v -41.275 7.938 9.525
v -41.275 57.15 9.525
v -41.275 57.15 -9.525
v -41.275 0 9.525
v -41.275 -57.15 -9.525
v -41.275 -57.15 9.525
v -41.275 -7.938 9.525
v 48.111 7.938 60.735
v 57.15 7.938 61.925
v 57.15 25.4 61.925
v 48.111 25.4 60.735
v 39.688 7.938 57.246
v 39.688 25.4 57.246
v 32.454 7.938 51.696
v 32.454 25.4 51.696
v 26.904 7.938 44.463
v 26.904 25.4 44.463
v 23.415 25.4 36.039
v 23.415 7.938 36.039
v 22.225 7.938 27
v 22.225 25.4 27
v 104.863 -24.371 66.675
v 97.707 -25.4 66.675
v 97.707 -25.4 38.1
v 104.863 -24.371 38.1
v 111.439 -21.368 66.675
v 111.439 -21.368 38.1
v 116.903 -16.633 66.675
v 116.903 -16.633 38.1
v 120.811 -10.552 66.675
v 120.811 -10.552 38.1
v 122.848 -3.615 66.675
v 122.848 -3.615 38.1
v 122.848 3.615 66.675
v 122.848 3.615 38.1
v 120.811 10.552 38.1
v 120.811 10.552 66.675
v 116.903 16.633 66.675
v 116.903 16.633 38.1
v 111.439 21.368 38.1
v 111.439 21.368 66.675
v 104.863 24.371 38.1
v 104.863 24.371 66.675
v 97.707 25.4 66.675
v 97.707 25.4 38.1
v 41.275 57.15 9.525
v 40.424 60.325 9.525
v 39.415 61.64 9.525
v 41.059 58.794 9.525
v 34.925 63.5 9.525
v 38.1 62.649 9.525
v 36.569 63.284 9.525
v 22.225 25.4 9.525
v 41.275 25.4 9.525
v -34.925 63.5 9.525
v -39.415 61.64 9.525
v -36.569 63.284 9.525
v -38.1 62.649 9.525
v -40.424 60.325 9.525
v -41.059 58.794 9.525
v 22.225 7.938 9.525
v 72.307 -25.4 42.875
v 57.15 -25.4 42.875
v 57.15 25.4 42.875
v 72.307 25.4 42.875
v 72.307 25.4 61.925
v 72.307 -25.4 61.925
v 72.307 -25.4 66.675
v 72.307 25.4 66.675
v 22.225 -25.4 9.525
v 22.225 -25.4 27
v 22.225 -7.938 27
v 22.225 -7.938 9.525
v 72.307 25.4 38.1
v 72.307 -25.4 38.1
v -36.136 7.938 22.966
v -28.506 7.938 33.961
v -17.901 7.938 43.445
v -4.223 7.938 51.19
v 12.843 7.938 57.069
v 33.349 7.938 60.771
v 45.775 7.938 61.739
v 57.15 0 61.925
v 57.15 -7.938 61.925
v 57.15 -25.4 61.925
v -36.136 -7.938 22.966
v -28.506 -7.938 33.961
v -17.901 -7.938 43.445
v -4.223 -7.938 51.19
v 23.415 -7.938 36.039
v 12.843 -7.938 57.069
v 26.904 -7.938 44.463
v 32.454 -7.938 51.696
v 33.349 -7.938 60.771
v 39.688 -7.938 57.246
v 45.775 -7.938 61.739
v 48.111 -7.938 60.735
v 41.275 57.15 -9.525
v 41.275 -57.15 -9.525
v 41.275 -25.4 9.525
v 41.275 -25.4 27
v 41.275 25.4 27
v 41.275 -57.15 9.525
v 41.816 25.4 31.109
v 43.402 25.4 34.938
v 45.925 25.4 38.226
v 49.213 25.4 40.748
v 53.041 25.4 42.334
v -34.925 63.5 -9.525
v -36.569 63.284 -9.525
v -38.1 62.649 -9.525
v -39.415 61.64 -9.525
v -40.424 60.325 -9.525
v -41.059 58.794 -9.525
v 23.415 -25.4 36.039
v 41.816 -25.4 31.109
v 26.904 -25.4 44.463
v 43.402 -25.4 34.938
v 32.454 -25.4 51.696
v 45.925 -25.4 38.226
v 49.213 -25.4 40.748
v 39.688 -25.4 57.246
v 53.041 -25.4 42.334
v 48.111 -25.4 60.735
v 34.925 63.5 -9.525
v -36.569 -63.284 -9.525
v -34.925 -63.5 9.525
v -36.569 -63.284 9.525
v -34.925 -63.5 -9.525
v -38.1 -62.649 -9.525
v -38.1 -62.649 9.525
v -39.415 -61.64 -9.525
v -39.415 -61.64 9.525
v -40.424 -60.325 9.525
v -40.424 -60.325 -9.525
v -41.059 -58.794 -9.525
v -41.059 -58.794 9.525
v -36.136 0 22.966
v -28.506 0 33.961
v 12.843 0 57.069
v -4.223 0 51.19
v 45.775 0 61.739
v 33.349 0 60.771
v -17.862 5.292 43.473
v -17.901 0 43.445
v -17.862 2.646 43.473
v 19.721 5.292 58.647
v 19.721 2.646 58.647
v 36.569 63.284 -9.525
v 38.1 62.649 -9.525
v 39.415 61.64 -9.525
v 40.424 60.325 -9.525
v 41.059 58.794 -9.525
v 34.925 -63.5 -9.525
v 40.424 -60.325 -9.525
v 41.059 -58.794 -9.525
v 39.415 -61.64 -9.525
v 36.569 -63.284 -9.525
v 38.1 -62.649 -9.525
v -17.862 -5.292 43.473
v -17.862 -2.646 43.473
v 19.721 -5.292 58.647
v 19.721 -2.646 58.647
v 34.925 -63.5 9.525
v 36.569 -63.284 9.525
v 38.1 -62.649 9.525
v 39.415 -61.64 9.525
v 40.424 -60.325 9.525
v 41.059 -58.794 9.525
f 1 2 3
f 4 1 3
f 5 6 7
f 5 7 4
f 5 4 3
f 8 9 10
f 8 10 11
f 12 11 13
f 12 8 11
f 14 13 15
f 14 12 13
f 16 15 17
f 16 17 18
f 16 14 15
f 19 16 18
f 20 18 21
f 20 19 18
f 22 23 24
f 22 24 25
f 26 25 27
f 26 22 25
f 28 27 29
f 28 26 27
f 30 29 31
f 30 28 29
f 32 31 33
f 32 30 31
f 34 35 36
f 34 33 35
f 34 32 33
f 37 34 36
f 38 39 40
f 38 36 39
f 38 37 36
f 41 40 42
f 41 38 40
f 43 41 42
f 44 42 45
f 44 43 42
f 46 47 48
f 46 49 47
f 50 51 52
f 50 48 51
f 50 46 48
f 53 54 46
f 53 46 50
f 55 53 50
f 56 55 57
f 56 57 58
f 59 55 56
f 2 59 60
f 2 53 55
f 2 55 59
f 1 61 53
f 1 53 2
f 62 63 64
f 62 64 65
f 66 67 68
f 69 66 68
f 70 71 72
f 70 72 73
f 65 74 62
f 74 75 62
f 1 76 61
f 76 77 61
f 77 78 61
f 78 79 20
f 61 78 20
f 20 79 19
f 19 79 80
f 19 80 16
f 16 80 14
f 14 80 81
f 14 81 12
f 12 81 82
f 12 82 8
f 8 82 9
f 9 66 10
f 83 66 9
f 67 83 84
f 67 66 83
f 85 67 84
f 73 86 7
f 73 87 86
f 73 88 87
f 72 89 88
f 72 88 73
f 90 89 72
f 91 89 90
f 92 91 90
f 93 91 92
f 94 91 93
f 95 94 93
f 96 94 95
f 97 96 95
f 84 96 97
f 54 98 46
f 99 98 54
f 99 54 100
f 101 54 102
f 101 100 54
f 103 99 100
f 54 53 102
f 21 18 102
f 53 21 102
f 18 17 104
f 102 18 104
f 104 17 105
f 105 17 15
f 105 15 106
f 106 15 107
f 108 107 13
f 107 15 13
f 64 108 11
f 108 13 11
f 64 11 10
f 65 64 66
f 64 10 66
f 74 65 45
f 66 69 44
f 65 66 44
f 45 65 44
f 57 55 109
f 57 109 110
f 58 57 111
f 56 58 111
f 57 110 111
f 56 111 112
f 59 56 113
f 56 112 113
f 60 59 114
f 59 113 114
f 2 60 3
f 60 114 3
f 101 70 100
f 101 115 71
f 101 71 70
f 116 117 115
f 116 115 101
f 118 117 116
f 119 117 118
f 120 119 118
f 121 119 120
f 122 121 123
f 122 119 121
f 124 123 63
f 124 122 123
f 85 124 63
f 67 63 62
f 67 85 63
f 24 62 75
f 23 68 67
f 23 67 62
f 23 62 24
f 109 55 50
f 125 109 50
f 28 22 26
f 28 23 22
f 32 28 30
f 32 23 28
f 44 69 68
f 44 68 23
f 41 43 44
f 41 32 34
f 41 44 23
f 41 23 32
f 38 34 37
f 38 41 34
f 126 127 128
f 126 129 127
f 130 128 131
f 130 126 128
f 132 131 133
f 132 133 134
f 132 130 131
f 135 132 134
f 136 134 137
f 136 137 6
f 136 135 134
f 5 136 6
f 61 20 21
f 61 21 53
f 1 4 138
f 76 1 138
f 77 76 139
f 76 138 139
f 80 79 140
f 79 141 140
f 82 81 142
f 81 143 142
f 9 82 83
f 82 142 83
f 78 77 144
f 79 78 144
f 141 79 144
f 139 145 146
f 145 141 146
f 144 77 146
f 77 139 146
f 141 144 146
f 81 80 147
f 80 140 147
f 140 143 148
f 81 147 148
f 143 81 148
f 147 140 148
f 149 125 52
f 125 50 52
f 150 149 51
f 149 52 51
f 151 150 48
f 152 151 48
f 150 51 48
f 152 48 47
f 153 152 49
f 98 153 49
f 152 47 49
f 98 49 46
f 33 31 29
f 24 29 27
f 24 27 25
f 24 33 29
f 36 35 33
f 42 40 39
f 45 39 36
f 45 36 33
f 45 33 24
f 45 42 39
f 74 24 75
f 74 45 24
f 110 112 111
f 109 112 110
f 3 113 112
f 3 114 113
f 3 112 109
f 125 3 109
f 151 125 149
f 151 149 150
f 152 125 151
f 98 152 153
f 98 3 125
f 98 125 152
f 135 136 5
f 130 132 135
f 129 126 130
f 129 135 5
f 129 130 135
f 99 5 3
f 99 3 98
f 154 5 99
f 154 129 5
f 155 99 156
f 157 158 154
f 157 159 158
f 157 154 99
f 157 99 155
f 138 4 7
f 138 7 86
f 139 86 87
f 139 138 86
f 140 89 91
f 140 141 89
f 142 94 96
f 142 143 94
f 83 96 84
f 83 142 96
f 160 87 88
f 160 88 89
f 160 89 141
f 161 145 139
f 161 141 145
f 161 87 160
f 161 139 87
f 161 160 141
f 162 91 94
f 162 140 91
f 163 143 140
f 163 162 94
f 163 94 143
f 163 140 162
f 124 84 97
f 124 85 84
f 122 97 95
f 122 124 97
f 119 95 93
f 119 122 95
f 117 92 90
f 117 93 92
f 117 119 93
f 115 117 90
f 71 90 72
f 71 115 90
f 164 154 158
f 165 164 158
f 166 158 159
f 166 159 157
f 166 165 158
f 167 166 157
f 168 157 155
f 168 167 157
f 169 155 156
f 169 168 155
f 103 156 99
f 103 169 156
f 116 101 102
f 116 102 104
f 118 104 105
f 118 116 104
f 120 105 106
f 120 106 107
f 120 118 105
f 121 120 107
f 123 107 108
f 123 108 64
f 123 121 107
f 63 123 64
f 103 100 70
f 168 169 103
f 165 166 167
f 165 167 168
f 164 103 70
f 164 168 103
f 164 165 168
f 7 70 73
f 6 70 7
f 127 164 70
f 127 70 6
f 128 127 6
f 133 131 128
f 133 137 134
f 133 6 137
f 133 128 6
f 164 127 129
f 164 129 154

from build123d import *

# Parameters (mm, degrees)
F1_DEPTH = 63.5
F0_W     = 25.4
F0_H     = 19.05
F0_H_2   = 4.7498
F0_H_3   = 4.7752
F2_DEPTH = 25.4
F3_DEPTH = 7.9375
F5_R     = 6.35


with BuildPart() as f1:
    # F0 (on Front) → F1 (new body, symmetric)
    with BuildSketch(Plane.XZ):
        Polygon((41.275, -9.525), (41.275, 9.525), (22.225, 9.525), (-41.275, 9.525), (-41.275, -9.525), align=None)
    extrude(amount=F1_DEPTH, both=True)

    # F0 (on Front) → F2 (join, symmetric)
    with BuildSketch(Plane.XZ):
        with BuildLine():
            Line((22.225, 9.525), (41.275, 9.525))
            Line((41.275, 9.525), (41.275, 27.0002))
            ThreePointArc((41.275, 27.0002), (45.9246798487, 38.2255201513), (57.15, 42.8752))
            Line((57.15, 42.8752), (72.3065137863, 42.8752))
            Line((72.3065137863, 42.8752), (72.3065137863, 61.9252))
            Line((72.3065137863, 61.9252), (57.15, 61.9252))
            ThreePointArc((57.15, 61.9252), (32.4542956671, 51.6959043329), (22.225, 27.0002))
            Line((22.225, 27.0002), (22.225, 9.525))
        make_face()
        with Locations((85.0065137863, 52.4002)):
            Rectangle(F0_W, F0_H)
        with Locations((85.0065137863, 64.3001)):
            Rectangle(F0_W, F0_H_2)
        with Locations((85.0065137863, 40.4876)):
            Rectangle(F0_W, F0_H_3)
    extrude(amount=F2_DEPTH, both=True)

    # F0 (on Front) → F3 (join, symmetric)
    with BuildSketch(Plane.XZ):
        with BuildLine():
            Line((-41.275, 9.525), (22.225, 9.525))
            Line((22.225, 9.525), (22.225, 27.0002))
            ThreePointArc((22.225, 27.0002), (32.4542956671, 51.6959043329), (57.15, 61.9252))
            add(Edge.make_bspline(
                [(-41.275, 9.525), (-29.7216698527, 55.1520250738), (24.5722677241, 62.3028567907), (57.15, 61.9252)],
                knots=[0, 0, 0, 0, 111.5045361635, 111.5045361635, 111.5045361635, 111.5045361635], degree=3))
        make_face()
    extrude(amount=F3_DEPTH, both=True)

    # F0 (on Front) → F4 (revolve)
    with BuildSketch(Plane.XZ):
        Polygon((97.7065137863, 61.9252), (97.7065137863, 42.8752), (97.7065137863, 38.1), (123.1065137863, 38.1), (123.1065137863, 66.675), (97.7065137863, 66.675), align=None)
    revolve(axis=Axis((97.7065137863, 0, 52.3875), (0, 0, 1)))

    # F5
    f5_edges = [f1.edges().sort_by_distance(p)[0] for p in [
        (41.275, -63.5, 0),
        (41.275, 63.5, 0),
        (-41.275, 63.5, 0),
        (-41.275, -63.5, 0),
    ]]
    fillet(f5_edges, radius=F5_R)


solid = f1.part
